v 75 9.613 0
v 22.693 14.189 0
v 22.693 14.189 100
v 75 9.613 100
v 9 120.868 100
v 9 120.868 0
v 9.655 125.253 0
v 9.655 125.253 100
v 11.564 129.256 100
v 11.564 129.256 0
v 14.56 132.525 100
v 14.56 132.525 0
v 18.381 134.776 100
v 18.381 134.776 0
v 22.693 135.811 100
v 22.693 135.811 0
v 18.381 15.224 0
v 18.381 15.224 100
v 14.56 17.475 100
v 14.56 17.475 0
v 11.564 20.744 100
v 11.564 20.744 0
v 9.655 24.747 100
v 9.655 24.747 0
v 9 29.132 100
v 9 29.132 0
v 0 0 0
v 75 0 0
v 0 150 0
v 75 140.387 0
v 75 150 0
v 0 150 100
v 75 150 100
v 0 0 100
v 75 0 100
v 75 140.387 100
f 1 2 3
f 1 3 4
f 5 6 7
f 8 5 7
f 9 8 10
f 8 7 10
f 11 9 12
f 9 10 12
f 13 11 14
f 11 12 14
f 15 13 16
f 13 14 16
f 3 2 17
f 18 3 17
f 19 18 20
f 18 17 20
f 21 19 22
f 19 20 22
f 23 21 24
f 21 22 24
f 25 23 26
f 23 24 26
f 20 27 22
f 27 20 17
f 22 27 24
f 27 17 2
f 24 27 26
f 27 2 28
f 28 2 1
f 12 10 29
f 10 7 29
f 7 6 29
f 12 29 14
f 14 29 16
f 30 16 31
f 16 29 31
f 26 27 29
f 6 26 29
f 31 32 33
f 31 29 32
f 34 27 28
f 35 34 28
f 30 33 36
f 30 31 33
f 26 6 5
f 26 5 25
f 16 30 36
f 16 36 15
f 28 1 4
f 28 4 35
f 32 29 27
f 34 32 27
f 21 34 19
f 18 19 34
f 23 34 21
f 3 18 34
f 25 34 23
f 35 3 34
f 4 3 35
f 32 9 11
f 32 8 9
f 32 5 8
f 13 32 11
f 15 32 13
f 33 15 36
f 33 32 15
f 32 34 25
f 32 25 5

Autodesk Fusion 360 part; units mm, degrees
sketch "スケッチ1" plane through (0, 0, 0) normal (0, 0, 1) x (1, 0, 0)
  line L0 (9, 120.8679) -> (9, 29.1321)
  line L1 (0, 150) -> (0, 0)
  line L2 (0, 0) -> (75, 0)
  line L3 (22.6927, 14.1892) -> (75, 9.6129)
  arc A0 (9, 29.1321) -> (22.6927, 14.1892) centre (24, 29.1321) ccw
  line L4 (75, 9.6129) -> (75, 0)
  line L5 (75, 140.3871) -> (22.6927, 135.8108)
  line L6 (0, 150) -> (75, 150)
  arc A1 (22.6927, 135.8108) -> (9, 120.8679) centre (24, 120.8679) ccw
  line L7 (75, 150) -> (75, 140.3871)
extrude "押し出し1" add sketch "スケッチ1" along normal blind 100
